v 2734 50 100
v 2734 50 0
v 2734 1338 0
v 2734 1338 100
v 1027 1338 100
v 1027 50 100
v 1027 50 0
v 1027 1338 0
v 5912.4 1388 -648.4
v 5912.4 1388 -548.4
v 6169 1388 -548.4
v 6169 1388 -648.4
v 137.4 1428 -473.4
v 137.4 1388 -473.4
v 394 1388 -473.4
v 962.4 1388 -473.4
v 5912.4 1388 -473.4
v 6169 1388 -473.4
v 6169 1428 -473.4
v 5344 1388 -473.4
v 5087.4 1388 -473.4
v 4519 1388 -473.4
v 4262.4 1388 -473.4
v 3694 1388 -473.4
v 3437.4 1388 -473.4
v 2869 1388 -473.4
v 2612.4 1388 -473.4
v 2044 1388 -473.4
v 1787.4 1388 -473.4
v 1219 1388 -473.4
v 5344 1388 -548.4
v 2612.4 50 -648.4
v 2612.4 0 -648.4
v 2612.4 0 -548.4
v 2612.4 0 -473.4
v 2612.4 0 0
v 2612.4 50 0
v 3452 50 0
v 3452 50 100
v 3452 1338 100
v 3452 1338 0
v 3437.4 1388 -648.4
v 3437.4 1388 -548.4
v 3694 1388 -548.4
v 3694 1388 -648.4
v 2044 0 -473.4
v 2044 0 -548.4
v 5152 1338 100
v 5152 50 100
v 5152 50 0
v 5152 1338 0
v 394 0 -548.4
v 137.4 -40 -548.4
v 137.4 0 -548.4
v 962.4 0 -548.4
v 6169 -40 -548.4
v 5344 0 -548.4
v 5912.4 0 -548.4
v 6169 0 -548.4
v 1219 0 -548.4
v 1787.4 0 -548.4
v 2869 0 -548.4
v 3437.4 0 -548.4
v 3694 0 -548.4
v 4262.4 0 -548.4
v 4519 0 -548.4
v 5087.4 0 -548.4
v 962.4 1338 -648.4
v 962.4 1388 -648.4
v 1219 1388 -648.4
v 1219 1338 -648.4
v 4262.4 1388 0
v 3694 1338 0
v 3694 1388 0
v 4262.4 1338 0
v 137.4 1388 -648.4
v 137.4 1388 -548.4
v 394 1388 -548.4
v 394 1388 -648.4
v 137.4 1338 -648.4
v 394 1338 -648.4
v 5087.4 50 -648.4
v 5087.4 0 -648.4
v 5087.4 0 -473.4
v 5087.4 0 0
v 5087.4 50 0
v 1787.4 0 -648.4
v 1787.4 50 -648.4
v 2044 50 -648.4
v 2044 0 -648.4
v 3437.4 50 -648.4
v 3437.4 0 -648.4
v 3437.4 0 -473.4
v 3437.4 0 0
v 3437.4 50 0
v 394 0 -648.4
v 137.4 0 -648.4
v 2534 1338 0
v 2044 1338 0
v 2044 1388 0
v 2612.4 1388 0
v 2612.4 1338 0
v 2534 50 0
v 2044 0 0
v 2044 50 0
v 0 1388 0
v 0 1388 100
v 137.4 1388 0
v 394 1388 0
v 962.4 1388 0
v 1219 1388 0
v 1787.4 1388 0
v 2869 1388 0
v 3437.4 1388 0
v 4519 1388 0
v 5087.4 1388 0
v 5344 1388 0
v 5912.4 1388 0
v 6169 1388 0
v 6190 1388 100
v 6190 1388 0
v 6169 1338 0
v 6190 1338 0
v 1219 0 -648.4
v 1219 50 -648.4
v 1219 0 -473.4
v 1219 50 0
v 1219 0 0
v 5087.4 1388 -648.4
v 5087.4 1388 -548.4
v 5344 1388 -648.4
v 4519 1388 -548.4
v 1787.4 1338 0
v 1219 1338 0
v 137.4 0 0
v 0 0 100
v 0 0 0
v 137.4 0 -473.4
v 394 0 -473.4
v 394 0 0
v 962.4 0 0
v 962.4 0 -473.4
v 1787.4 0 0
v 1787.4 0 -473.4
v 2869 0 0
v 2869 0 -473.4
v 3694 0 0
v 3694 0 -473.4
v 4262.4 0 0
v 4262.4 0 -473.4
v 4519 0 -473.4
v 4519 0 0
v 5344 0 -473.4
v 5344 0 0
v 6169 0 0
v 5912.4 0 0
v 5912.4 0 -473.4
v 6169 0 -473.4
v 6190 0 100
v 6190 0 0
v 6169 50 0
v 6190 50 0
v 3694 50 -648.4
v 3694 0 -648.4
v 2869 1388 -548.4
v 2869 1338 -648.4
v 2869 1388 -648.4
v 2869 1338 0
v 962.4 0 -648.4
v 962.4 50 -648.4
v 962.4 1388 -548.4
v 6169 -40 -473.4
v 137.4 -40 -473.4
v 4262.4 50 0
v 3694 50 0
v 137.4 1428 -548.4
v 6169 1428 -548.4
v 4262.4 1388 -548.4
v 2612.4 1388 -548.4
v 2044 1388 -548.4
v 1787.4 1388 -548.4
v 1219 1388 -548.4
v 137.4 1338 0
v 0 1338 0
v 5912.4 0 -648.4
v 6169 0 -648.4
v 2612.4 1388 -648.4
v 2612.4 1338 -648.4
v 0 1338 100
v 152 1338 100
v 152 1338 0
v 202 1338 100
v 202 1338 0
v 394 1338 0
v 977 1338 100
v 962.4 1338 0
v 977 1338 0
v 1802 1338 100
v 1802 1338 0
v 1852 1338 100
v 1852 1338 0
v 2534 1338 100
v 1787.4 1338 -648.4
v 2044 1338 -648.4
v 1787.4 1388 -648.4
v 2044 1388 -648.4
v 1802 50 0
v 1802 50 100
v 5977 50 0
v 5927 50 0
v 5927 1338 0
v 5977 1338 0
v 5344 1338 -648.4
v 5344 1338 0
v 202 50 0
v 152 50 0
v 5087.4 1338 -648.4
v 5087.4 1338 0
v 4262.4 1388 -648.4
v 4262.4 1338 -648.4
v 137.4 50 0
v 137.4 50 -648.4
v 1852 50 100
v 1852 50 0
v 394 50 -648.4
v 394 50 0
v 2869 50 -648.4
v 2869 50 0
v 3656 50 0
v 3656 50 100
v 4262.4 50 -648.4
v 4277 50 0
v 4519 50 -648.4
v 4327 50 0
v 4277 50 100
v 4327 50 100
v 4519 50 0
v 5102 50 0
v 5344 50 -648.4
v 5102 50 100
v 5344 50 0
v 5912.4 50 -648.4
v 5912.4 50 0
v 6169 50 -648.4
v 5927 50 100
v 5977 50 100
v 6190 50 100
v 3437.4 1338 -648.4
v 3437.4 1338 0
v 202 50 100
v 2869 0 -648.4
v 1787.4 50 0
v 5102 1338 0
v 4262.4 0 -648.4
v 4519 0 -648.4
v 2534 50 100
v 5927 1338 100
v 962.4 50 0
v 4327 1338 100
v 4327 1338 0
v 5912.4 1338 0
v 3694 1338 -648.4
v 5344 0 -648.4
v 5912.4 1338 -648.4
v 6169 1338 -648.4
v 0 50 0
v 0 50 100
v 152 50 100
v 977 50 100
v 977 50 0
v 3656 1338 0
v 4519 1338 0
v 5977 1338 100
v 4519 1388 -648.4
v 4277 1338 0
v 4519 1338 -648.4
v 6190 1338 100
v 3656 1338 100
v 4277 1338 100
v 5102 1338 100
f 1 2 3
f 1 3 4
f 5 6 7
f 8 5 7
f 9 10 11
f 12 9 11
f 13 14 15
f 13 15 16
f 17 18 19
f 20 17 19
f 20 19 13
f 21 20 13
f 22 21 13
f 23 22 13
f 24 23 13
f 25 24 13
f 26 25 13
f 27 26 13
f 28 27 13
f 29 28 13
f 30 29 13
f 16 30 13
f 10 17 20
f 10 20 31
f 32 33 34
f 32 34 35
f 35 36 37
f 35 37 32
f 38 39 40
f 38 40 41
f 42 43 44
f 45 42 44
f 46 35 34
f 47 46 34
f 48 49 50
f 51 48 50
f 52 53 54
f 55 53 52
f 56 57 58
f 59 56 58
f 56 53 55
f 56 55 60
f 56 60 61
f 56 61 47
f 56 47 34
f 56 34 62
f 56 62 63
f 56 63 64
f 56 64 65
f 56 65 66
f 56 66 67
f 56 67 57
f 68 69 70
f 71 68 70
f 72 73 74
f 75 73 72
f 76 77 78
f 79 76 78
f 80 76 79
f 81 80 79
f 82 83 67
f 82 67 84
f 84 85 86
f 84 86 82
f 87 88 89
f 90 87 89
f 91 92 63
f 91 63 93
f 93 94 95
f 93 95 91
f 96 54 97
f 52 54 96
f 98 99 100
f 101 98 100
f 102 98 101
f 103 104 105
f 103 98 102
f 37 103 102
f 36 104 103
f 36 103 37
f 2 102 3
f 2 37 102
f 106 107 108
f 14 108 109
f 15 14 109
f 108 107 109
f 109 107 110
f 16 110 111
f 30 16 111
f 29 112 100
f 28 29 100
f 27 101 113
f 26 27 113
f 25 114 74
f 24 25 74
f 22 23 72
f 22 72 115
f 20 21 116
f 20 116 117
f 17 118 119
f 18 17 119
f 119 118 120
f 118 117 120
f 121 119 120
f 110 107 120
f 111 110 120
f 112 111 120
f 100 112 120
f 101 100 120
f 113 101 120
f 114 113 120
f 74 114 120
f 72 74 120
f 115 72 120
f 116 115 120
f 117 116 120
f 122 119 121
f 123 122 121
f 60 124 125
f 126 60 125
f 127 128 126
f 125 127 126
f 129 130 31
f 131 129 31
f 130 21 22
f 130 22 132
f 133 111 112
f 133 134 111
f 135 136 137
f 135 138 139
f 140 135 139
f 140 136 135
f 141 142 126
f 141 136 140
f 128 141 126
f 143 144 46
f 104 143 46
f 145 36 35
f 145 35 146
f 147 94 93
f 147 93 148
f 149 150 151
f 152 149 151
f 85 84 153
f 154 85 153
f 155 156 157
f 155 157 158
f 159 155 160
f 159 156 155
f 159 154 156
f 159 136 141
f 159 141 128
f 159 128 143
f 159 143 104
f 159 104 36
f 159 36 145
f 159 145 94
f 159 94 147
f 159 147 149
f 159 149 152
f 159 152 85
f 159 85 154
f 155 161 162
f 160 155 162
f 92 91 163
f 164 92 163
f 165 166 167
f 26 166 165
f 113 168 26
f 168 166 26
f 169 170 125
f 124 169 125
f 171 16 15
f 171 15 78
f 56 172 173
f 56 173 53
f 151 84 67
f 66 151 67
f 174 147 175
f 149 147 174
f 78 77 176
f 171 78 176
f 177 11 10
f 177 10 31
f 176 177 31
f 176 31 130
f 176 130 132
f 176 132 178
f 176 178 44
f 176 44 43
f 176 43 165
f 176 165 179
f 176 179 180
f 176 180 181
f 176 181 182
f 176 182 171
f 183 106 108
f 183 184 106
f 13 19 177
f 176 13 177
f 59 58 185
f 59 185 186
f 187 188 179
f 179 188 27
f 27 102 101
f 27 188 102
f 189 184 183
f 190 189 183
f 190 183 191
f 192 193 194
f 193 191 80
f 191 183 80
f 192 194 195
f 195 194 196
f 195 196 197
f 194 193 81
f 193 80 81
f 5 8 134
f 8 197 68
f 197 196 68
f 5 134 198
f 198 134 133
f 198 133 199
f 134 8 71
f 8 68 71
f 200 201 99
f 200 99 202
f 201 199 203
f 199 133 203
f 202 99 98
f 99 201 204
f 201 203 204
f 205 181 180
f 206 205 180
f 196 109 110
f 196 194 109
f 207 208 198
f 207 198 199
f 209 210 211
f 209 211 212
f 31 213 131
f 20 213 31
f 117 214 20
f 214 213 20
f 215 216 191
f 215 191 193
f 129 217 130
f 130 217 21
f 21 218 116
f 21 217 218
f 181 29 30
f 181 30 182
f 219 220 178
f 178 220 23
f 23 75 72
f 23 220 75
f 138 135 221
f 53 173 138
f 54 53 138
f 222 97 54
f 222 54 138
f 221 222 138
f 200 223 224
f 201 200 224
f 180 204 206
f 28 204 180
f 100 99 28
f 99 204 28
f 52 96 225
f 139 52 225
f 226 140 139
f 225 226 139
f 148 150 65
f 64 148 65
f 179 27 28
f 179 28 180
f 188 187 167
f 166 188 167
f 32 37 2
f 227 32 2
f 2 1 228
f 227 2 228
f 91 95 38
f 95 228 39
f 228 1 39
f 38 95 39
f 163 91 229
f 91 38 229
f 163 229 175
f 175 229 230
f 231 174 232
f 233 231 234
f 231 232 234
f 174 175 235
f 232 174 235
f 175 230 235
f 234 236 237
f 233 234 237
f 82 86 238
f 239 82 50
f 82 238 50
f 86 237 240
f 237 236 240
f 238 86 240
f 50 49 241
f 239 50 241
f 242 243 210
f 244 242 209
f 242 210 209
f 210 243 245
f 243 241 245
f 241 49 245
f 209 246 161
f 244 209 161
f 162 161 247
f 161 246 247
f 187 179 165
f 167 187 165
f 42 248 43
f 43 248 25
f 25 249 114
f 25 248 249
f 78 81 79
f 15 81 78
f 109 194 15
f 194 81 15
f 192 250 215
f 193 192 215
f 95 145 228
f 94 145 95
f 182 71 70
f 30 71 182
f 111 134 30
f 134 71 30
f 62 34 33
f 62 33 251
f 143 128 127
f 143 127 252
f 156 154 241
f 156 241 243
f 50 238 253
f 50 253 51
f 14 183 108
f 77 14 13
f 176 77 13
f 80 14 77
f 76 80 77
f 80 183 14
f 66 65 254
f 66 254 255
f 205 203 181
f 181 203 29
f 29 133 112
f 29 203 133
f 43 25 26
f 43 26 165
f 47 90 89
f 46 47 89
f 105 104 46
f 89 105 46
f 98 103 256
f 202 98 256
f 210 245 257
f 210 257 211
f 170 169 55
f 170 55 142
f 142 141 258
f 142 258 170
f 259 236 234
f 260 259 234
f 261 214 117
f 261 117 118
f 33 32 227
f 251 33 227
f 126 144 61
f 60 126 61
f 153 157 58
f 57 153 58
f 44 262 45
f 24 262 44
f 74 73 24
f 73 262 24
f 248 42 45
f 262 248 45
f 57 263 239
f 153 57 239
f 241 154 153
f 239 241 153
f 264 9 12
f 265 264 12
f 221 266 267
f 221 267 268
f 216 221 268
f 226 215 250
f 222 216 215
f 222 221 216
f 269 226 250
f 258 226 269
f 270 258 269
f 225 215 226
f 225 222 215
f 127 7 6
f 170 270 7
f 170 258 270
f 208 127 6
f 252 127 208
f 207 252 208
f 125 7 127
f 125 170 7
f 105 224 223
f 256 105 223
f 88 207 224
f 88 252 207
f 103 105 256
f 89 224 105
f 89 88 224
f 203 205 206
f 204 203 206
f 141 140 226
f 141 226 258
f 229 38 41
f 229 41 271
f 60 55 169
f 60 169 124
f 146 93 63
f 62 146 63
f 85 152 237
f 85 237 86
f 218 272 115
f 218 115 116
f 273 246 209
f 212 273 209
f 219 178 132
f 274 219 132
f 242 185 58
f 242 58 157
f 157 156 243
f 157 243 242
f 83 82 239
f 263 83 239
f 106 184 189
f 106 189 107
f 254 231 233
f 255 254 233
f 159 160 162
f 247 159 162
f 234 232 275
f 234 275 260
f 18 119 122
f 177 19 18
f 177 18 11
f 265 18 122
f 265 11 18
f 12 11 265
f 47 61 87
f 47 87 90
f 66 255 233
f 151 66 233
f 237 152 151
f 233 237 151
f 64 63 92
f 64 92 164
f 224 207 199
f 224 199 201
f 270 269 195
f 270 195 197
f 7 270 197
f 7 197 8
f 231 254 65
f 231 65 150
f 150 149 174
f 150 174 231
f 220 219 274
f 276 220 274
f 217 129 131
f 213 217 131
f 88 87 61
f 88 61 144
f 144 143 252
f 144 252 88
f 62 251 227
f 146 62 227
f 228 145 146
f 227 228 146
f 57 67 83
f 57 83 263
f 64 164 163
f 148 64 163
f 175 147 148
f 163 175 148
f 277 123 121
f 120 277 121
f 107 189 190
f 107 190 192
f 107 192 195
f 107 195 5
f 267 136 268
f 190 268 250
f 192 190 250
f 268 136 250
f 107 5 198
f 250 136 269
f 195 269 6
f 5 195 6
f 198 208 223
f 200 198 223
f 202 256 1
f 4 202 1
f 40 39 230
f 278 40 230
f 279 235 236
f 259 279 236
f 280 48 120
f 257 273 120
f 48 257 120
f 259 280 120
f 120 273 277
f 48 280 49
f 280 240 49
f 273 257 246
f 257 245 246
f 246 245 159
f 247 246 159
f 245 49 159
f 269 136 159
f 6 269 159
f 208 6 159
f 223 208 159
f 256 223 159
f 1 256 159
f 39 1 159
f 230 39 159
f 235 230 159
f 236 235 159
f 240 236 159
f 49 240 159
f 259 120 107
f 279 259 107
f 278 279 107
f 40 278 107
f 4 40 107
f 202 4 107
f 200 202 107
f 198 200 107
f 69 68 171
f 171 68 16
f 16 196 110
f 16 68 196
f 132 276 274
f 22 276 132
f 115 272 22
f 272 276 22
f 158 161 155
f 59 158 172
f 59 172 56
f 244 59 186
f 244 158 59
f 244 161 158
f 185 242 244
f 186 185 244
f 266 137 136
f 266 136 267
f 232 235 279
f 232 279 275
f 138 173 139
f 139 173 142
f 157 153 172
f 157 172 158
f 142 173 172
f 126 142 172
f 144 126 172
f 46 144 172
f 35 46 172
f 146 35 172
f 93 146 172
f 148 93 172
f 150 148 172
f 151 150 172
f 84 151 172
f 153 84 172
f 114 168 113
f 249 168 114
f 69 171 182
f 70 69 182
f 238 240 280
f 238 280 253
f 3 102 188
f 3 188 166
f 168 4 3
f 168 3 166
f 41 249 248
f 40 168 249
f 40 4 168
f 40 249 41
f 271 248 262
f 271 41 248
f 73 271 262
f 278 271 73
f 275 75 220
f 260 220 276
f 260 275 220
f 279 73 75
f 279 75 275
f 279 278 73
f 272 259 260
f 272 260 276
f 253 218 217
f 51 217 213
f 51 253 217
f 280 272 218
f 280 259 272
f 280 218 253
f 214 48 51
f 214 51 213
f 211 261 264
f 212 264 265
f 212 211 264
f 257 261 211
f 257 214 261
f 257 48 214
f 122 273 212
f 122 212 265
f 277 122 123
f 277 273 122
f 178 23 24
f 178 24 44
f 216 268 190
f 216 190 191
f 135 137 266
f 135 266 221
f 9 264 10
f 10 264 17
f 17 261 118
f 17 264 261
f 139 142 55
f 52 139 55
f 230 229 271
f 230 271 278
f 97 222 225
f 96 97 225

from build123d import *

# Parameters (mm, degrees)
SKETCH1_W             = 6190
SKETCH1_H             = 50
BOSS_EXTRUDE1_DEPTH   = 100
BOSS_EXTRUDE1_2_DEPTH = 100
SKETCH2_W             = 200
SKETCH2_H             = 100
BOSS_EXTRUDE2_DEPTH   = 1388
SKETCH4_W             = 50
SKETCH4_H             = 100
BOSS_EXTRUDE3_DEPTH   = 1288
SKETCH5_W             = 256.6
SKETCH5_H             = 50
BOSS_EXTRUDE4_DEPTH   = 648.4
BOSS_EXTRUDE12_REACH  = 6358.377
SKETCH13_W            = 75
SKETCH13_H            = 40


with BuildPart() as part:
    # Sketch1 → Boss-Extrude1 (new body)
    with BuildSketch(Plane.XY):
        with Locations((3095, 1363)):
            Rectangle(SKETCH1_W, SKETCH1_H)
    extrude(amount=BOSS_EXTRUDE1_DEPTH)



with BuildPart() as body_2:
    # Sketch1 → Boss-Extrude1 2 (new body)
    with BuildSketch(Plane.XY):
        with Locations((3095, 25)):
            Rectangle(SKETCH1_W, SKETCH1_H)
    extrude(amount=BOSS_EXTRUDE1_2_DEPTH)


with BuildPart() as part_1:
    add(part.part)

    add(body_2.part)  # Boss-Extrude2 merges body 2
    # Sketch2 → Boss-Extrude2 (add)
    with BuildSketch(Plane.XZ):
        with Locations((2634, 50)):
            Rectangle(SKETCH2_W, SKETCH2_H)
        with Locations((3556, 50)):
            Rectangle(SKETCH2_W, SKETCH2_H)
    extrude(amount=-BOSS_EXTRUDE2_DEPTH)

    # Sketch4 → Boss-Extrude3 (add)
    with BuildSketch(Plane(origin=(0, 50, 0), x_dir=(1, 0, 0), z_dir=(0, 1, 0))):
        with Locations((177, -50)):
            Rectangle(SKETCH4_W, SKETCH4_H)
        with Locations((1002, -50)):
            Rectangle(SKETCH4_W, SKETCH4_H)
        with Locations((1827, -50)):
            Rectangle(SKETCH4_W, SKETCH4_H)
        with Locations((2652, -50)):
            Rectangle(SKETCH4_W, SKETCH4_H)
        with Locations((3477, -50)):
            Rectangle(SKETCH4_W, SKETCH4_H)
        with Locations((4302, -50)):
            Rectangle(SKETCH4_W, SKETCH4_H)
        with Locations((5127, -50)):
            Rectangle(SKETCH4_W, SKETCH4_H)
        with Locations((5952, -50)):
            Rectangle(SKETCH4_W, SKETCH4_H)
    extrude(amount=BOSS_EXTRUDE3_DEPTH)

    # Sketch5 → Boss-Extrude4 (add)
    with BuildSketch(Plane.XY):
        with Locations((6040.7, 1363)):
            Rectangle(SKETCH5_W, SKETCH5_H)
        with Locations((265.7, 1363)):
            Rectangle(SKETCH5_W, SKETCH5_H)
        with Locations((265.7, 25)):
            Rectangle(SKETCH5_W, SKETCH5_H)
        with Locations((6040.7, 25)):
            Rectangle(SKETCH5_W, SKETCH5_H)
        with Locations((5215.7, 25)):
            Rectangle(SKETCH5_W, SKETCH5_H)
        with Locations((1090.7, 1363)):
            Rectangle(SKETCH5_W, SKETCH5_H)
        with Locations((4390.7, 25)):
            Rectangle(SKETCH5_W, SKETCH5_H)
        with Locations((1915.7, 1363)):
            Rectangle(SKETCH5_W, SKETCH5_H)
        with Locations((3565.7, 25)):
            Rectangle(SKETCH5_W, SKETCH5_H)
        with Locations((2740.7, 1363)):
            Rectangle(SKETCH5_W, SKETCH5_H)
        with Locations((2740.7, 25)):
            Rectangle(SKETCH5_W, SKETCH5_H)
        with Locations((3565.7, 1363)):
            Rectangle(SKETCH5_W, SKETCH5_H)
        with Locations((1915.7, 25)):
            Rectangle(SKETCH5_W, SKETCH5_H)
        with Locations((1090.7, 25)):
            Rectangle(SKETCH5_W, SKETCH5_H)
        with Locations((4390.7, 1363)):
            Rectangle(SKETCH5_W, SKETCH5_H)
        with Locations((5215.7, 1363)):
            Rectangle(SKETCH5_W, SKETCH5_H)
    extrude(amount=-BOSS_EXTRUDE4_DEPTH)

    # Boss-Extrude12: up to this face of the body (flat: up to its plane)
    boss_extrude12_end = Plane(part_1.part.faces().sort_by_distance((137.4, 1363, -324.2))[0])
    # Sketch13 → Boss-Extrude12 (add, up to the picked face)
    with BuildSketch(Plane(origin=(6169, 0, 0), x_dir=(0, 0, -1), z_dir=(1, 0, 0)), mode=Mode.PRIVATE) as boss_extrude12_sk1:
        with Locations((510.9, -20)):
            Rectangle(SKETCH13_W, SKETCH13_H)
    boss_extrude12_tool1 = split(extrude(boss_extrude12_sk1.sketch, amount=-BOSS_EXTRUDE12_REACH, mode=Mode.PRIVATE), bisect_by=boss_extrude12_end, keep=Keep.BOTH, mode=Mode.PRIVATE)
    # Sketch13 → Boss-Extrude12 (add, up to the picked face)
    with BuildSketch(Plane(origin=(6169, 0, 0), x_dir=(0, 0, -1), z_dir=(1, 0, 0)), mode=Mode.PRIVATE) as boss_extrude12_sk2:
        with Locations((510.9, 1408)):
            Rectangle(SKETCH13_W, SKETCH13_H)
    boss_extrude12_tool2 = split(extrude(boss_extrude12_sk2.sketch, amount=-BOSS_EXTRUDE12_REACH, mode=Mode.PRIVATE), bisect_by=boss_extrude12_end, keep=Keep.BOTH, mode=Mode.PRIVATE)
    add(boss_extrude12_tool1.solids().sort_by(Axis((6169, -20, -510.9), (-1, 0, 0)))[0])
    add(boss_extrude12_tool2.solids().sort_by(Axis((6169, 1408, -510.9), (-1, 0, 0)))[0])


solid = part_1.part
